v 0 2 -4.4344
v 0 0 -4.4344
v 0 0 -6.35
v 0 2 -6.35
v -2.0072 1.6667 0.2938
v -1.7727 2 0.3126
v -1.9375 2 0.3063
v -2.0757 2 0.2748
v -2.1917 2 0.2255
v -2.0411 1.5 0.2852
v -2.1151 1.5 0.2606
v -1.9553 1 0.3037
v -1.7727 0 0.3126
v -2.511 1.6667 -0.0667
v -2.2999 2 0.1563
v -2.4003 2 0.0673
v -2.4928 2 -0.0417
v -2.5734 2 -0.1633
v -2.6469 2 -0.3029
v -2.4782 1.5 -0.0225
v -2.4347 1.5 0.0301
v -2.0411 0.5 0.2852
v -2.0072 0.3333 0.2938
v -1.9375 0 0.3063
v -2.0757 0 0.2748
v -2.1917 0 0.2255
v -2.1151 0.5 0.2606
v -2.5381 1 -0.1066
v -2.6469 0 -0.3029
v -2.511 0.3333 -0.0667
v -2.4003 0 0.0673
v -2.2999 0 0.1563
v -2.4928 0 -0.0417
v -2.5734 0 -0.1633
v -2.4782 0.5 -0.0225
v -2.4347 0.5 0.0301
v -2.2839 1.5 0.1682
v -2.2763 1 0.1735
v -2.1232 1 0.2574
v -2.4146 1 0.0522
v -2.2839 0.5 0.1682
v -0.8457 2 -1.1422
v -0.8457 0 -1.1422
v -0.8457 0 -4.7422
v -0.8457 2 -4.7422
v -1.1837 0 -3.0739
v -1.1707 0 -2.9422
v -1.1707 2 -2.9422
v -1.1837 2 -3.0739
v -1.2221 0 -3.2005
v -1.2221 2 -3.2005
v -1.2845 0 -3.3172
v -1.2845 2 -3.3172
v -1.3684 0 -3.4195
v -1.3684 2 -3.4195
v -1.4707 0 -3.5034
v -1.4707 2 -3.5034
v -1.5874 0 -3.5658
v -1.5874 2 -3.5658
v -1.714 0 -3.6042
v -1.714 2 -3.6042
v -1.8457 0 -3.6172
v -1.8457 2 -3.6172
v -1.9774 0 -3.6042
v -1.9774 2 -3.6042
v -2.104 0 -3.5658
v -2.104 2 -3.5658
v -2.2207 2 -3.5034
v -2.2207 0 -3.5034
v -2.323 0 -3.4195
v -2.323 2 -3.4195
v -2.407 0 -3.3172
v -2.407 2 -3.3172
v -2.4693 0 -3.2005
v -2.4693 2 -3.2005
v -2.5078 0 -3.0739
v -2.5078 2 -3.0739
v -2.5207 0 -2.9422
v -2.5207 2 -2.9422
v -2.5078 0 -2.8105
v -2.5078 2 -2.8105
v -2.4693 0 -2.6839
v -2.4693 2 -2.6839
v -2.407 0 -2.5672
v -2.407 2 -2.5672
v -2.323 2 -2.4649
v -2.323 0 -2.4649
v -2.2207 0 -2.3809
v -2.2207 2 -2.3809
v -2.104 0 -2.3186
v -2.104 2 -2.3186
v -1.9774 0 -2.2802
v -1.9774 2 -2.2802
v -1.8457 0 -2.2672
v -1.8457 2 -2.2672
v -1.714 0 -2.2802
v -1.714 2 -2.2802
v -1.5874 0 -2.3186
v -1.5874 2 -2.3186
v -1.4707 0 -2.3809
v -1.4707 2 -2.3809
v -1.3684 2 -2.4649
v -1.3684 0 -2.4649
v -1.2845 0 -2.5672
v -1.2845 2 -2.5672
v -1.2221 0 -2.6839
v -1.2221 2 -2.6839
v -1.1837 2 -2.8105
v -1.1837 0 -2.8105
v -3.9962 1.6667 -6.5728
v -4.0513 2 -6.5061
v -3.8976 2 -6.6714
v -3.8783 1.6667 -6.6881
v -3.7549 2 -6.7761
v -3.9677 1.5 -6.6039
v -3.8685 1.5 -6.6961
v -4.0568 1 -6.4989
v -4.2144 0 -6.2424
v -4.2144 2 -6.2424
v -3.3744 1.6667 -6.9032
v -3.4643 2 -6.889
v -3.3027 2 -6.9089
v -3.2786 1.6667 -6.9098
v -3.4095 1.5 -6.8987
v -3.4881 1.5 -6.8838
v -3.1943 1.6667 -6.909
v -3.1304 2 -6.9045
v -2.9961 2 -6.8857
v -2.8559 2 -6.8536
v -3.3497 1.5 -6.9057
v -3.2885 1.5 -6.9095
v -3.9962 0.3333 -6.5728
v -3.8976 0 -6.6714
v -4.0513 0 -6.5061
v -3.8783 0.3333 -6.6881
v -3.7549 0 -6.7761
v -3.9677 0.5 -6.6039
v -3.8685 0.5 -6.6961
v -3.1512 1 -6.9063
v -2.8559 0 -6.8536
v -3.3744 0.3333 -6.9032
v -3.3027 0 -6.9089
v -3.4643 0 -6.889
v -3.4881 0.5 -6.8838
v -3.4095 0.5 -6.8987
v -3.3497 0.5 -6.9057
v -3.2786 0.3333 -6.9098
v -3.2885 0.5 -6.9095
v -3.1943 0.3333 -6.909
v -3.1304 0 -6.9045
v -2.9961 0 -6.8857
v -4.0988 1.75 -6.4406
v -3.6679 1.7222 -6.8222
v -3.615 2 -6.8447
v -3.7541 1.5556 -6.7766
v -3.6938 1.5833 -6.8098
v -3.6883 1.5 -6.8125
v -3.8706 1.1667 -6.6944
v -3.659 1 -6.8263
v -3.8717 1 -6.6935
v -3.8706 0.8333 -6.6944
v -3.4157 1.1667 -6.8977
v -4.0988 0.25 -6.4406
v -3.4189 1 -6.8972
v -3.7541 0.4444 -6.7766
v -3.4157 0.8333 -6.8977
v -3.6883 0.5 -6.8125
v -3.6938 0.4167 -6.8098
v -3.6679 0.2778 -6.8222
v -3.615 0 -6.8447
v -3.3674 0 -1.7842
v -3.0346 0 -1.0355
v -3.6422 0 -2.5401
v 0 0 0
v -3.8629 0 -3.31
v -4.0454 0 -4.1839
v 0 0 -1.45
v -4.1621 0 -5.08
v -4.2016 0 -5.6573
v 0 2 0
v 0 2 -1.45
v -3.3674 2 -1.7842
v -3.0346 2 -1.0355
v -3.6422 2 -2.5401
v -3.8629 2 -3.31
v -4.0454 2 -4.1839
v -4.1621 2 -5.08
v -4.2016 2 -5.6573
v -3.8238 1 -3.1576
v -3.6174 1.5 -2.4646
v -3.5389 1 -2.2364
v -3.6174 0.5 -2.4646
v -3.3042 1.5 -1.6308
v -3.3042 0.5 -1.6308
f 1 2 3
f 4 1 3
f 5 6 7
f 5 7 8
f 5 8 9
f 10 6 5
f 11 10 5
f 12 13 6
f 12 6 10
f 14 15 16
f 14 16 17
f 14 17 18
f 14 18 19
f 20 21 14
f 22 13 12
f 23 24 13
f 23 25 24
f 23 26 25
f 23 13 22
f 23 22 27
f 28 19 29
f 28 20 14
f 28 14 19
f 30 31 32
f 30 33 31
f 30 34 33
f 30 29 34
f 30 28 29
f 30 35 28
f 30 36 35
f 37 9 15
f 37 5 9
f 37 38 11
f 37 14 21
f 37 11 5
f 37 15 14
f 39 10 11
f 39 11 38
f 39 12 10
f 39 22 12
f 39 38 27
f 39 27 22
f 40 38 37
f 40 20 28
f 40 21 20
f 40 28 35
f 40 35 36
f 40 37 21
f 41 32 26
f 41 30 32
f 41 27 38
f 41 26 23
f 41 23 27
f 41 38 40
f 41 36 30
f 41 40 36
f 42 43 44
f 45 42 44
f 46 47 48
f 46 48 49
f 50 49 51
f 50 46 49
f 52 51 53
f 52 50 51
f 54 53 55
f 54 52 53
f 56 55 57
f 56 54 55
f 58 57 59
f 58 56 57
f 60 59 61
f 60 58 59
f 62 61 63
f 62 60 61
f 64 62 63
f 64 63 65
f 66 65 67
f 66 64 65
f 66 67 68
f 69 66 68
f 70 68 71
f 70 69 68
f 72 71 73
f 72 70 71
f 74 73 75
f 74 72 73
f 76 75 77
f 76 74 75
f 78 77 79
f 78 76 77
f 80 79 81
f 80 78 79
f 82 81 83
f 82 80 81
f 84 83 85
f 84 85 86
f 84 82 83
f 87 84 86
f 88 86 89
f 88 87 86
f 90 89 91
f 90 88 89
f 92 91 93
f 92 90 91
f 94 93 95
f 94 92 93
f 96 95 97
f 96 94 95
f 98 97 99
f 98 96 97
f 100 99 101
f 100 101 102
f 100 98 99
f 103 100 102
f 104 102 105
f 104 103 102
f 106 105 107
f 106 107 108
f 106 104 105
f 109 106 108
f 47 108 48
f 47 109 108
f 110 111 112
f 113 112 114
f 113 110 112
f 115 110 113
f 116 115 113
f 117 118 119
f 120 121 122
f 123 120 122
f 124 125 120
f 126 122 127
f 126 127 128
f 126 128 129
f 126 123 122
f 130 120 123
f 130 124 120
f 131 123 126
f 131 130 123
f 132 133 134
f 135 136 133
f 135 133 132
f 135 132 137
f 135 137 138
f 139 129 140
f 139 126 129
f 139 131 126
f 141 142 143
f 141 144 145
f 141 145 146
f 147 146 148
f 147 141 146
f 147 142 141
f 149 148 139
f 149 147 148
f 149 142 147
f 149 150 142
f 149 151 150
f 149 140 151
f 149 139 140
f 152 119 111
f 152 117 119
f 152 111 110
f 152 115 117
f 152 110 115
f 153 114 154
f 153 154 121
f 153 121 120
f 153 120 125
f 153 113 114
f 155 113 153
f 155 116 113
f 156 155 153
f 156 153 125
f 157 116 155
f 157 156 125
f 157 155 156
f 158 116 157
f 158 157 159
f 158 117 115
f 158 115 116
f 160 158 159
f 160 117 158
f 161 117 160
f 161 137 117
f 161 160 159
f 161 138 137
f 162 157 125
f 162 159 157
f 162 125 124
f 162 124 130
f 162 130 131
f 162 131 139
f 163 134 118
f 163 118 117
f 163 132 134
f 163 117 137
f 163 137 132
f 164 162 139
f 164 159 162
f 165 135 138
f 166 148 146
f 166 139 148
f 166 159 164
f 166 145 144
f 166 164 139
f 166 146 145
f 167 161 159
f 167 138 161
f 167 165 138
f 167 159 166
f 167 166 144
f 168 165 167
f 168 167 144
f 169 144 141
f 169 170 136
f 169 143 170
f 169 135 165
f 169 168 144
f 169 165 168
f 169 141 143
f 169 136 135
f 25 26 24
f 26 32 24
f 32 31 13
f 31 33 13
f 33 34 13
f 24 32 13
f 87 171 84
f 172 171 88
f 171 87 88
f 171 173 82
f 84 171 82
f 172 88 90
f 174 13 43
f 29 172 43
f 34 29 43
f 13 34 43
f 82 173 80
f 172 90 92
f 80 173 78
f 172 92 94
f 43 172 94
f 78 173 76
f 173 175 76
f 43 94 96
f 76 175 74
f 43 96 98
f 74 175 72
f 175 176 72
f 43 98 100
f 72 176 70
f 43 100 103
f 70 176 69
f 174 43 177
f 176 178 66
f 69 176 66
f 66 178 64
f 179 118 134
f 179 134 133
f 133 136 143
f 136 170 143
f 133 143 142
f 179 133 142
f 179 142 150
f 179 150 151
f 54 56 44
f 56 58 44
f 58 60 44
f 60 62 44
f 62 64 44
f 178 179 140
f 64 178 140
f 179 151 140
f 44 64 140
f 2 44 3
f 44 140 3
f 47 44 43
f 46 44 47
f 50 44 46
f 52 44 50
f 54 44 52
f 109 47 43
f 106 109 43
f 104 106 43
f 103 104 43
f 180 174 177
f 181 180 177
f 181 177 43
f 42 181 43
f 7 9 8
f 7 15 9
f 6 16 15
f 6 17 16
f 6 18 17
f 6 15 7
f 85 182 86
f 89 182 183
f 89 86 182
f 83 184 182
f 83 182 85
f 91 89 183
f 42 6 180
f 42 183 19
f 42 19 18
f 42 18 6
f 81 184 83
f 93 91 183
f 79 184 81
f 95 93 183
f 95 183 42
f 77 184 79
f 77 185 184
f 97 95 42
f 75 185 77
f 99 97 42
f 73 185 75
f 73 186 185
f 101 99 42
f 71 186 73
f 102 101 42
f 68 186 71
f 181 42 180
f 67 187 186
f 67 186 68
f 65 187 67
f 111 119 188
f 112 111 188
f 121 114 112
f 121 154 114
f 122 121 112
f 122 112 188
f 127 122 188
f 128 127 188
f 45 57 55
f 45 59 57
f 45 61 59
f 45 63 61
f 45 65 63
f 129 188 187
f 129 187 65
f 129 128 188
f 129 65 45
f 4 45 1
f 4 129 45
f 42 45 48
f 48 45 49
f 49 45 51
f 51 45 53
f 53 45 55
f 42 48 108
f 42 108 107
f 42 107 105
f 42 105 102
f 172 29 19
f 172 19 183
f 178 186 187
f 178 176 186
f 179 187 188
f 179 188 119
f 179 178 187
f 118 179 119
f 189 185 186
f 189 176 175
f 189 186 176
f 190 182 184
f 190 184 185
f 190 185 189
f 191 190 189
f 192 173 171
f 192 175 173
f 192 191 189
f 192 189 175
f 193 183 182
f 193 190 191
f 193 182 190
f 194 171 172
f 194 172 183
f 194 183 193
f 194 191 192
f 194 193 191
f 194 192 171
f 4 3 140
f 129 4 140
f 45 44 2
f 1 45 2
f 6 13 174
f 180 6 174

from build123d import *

# Parameters (mm, degrees)
SKETCH1_R           = 0.675
BOSS_EXTRUDE1_DEPTH = 2


with BuildPart() as part:
    # Sketch1 → Boss-Extrude1 (new body)
    with BuildSketch(Plane(origin=(0, 0, 0), x_dir=(1, 0, 0), z_dir=(0, 1, 0))):
        with BuildLine():
            Line((-1.772653955, -0.31256672), (0, 0))
            Line((0, 0), (0, 1.45))
            Line((0, 1.45), (-0.845723359, 1.142181871))
            Line((-0.845723359, 1.142181871), (-0.845723359, 4.742181871))
            Line((-0.845723359, 4.742181871), (0, 4.434363742))
            Line((0, 4.434363742), (0, 6.35))
            Line((0, 6.35), (-2.855942484, 6.853579715))
            add(Edge.make_bspline(
                [(-4.214404462, 6.242429297), (-3.782908861, 7.104554386), (-2.855942484, 6.853579715)],
                knots=[0, 0, 0, 1, 1, 1], degree=2))
            add(Edge.make_bspline(
                [(-2.646853101, 0.302878761), (-4.217046525, 3.042629381), (-4.214404462, 6.242429297)],
                knots=[0, 0, 0, 1, 1, 1], degree=2))
            add(Edge.make_bspline(
                [(-1.772653955, -0.31256672), (-2.342932983, -0.342253748), (-2.646853101, 0.302878761)],
                knots=[0, 0, 0, 1, 1, 1], degree=2))
        make_face()
        with Locations((-1.845723359, 2.942181871)):
            Circle(SKETCH1_R, mode=Mode.SUBTRACT)
    extrude(amount=BOSS_EXTRUDE1_DEPTH)


solid = part.part
